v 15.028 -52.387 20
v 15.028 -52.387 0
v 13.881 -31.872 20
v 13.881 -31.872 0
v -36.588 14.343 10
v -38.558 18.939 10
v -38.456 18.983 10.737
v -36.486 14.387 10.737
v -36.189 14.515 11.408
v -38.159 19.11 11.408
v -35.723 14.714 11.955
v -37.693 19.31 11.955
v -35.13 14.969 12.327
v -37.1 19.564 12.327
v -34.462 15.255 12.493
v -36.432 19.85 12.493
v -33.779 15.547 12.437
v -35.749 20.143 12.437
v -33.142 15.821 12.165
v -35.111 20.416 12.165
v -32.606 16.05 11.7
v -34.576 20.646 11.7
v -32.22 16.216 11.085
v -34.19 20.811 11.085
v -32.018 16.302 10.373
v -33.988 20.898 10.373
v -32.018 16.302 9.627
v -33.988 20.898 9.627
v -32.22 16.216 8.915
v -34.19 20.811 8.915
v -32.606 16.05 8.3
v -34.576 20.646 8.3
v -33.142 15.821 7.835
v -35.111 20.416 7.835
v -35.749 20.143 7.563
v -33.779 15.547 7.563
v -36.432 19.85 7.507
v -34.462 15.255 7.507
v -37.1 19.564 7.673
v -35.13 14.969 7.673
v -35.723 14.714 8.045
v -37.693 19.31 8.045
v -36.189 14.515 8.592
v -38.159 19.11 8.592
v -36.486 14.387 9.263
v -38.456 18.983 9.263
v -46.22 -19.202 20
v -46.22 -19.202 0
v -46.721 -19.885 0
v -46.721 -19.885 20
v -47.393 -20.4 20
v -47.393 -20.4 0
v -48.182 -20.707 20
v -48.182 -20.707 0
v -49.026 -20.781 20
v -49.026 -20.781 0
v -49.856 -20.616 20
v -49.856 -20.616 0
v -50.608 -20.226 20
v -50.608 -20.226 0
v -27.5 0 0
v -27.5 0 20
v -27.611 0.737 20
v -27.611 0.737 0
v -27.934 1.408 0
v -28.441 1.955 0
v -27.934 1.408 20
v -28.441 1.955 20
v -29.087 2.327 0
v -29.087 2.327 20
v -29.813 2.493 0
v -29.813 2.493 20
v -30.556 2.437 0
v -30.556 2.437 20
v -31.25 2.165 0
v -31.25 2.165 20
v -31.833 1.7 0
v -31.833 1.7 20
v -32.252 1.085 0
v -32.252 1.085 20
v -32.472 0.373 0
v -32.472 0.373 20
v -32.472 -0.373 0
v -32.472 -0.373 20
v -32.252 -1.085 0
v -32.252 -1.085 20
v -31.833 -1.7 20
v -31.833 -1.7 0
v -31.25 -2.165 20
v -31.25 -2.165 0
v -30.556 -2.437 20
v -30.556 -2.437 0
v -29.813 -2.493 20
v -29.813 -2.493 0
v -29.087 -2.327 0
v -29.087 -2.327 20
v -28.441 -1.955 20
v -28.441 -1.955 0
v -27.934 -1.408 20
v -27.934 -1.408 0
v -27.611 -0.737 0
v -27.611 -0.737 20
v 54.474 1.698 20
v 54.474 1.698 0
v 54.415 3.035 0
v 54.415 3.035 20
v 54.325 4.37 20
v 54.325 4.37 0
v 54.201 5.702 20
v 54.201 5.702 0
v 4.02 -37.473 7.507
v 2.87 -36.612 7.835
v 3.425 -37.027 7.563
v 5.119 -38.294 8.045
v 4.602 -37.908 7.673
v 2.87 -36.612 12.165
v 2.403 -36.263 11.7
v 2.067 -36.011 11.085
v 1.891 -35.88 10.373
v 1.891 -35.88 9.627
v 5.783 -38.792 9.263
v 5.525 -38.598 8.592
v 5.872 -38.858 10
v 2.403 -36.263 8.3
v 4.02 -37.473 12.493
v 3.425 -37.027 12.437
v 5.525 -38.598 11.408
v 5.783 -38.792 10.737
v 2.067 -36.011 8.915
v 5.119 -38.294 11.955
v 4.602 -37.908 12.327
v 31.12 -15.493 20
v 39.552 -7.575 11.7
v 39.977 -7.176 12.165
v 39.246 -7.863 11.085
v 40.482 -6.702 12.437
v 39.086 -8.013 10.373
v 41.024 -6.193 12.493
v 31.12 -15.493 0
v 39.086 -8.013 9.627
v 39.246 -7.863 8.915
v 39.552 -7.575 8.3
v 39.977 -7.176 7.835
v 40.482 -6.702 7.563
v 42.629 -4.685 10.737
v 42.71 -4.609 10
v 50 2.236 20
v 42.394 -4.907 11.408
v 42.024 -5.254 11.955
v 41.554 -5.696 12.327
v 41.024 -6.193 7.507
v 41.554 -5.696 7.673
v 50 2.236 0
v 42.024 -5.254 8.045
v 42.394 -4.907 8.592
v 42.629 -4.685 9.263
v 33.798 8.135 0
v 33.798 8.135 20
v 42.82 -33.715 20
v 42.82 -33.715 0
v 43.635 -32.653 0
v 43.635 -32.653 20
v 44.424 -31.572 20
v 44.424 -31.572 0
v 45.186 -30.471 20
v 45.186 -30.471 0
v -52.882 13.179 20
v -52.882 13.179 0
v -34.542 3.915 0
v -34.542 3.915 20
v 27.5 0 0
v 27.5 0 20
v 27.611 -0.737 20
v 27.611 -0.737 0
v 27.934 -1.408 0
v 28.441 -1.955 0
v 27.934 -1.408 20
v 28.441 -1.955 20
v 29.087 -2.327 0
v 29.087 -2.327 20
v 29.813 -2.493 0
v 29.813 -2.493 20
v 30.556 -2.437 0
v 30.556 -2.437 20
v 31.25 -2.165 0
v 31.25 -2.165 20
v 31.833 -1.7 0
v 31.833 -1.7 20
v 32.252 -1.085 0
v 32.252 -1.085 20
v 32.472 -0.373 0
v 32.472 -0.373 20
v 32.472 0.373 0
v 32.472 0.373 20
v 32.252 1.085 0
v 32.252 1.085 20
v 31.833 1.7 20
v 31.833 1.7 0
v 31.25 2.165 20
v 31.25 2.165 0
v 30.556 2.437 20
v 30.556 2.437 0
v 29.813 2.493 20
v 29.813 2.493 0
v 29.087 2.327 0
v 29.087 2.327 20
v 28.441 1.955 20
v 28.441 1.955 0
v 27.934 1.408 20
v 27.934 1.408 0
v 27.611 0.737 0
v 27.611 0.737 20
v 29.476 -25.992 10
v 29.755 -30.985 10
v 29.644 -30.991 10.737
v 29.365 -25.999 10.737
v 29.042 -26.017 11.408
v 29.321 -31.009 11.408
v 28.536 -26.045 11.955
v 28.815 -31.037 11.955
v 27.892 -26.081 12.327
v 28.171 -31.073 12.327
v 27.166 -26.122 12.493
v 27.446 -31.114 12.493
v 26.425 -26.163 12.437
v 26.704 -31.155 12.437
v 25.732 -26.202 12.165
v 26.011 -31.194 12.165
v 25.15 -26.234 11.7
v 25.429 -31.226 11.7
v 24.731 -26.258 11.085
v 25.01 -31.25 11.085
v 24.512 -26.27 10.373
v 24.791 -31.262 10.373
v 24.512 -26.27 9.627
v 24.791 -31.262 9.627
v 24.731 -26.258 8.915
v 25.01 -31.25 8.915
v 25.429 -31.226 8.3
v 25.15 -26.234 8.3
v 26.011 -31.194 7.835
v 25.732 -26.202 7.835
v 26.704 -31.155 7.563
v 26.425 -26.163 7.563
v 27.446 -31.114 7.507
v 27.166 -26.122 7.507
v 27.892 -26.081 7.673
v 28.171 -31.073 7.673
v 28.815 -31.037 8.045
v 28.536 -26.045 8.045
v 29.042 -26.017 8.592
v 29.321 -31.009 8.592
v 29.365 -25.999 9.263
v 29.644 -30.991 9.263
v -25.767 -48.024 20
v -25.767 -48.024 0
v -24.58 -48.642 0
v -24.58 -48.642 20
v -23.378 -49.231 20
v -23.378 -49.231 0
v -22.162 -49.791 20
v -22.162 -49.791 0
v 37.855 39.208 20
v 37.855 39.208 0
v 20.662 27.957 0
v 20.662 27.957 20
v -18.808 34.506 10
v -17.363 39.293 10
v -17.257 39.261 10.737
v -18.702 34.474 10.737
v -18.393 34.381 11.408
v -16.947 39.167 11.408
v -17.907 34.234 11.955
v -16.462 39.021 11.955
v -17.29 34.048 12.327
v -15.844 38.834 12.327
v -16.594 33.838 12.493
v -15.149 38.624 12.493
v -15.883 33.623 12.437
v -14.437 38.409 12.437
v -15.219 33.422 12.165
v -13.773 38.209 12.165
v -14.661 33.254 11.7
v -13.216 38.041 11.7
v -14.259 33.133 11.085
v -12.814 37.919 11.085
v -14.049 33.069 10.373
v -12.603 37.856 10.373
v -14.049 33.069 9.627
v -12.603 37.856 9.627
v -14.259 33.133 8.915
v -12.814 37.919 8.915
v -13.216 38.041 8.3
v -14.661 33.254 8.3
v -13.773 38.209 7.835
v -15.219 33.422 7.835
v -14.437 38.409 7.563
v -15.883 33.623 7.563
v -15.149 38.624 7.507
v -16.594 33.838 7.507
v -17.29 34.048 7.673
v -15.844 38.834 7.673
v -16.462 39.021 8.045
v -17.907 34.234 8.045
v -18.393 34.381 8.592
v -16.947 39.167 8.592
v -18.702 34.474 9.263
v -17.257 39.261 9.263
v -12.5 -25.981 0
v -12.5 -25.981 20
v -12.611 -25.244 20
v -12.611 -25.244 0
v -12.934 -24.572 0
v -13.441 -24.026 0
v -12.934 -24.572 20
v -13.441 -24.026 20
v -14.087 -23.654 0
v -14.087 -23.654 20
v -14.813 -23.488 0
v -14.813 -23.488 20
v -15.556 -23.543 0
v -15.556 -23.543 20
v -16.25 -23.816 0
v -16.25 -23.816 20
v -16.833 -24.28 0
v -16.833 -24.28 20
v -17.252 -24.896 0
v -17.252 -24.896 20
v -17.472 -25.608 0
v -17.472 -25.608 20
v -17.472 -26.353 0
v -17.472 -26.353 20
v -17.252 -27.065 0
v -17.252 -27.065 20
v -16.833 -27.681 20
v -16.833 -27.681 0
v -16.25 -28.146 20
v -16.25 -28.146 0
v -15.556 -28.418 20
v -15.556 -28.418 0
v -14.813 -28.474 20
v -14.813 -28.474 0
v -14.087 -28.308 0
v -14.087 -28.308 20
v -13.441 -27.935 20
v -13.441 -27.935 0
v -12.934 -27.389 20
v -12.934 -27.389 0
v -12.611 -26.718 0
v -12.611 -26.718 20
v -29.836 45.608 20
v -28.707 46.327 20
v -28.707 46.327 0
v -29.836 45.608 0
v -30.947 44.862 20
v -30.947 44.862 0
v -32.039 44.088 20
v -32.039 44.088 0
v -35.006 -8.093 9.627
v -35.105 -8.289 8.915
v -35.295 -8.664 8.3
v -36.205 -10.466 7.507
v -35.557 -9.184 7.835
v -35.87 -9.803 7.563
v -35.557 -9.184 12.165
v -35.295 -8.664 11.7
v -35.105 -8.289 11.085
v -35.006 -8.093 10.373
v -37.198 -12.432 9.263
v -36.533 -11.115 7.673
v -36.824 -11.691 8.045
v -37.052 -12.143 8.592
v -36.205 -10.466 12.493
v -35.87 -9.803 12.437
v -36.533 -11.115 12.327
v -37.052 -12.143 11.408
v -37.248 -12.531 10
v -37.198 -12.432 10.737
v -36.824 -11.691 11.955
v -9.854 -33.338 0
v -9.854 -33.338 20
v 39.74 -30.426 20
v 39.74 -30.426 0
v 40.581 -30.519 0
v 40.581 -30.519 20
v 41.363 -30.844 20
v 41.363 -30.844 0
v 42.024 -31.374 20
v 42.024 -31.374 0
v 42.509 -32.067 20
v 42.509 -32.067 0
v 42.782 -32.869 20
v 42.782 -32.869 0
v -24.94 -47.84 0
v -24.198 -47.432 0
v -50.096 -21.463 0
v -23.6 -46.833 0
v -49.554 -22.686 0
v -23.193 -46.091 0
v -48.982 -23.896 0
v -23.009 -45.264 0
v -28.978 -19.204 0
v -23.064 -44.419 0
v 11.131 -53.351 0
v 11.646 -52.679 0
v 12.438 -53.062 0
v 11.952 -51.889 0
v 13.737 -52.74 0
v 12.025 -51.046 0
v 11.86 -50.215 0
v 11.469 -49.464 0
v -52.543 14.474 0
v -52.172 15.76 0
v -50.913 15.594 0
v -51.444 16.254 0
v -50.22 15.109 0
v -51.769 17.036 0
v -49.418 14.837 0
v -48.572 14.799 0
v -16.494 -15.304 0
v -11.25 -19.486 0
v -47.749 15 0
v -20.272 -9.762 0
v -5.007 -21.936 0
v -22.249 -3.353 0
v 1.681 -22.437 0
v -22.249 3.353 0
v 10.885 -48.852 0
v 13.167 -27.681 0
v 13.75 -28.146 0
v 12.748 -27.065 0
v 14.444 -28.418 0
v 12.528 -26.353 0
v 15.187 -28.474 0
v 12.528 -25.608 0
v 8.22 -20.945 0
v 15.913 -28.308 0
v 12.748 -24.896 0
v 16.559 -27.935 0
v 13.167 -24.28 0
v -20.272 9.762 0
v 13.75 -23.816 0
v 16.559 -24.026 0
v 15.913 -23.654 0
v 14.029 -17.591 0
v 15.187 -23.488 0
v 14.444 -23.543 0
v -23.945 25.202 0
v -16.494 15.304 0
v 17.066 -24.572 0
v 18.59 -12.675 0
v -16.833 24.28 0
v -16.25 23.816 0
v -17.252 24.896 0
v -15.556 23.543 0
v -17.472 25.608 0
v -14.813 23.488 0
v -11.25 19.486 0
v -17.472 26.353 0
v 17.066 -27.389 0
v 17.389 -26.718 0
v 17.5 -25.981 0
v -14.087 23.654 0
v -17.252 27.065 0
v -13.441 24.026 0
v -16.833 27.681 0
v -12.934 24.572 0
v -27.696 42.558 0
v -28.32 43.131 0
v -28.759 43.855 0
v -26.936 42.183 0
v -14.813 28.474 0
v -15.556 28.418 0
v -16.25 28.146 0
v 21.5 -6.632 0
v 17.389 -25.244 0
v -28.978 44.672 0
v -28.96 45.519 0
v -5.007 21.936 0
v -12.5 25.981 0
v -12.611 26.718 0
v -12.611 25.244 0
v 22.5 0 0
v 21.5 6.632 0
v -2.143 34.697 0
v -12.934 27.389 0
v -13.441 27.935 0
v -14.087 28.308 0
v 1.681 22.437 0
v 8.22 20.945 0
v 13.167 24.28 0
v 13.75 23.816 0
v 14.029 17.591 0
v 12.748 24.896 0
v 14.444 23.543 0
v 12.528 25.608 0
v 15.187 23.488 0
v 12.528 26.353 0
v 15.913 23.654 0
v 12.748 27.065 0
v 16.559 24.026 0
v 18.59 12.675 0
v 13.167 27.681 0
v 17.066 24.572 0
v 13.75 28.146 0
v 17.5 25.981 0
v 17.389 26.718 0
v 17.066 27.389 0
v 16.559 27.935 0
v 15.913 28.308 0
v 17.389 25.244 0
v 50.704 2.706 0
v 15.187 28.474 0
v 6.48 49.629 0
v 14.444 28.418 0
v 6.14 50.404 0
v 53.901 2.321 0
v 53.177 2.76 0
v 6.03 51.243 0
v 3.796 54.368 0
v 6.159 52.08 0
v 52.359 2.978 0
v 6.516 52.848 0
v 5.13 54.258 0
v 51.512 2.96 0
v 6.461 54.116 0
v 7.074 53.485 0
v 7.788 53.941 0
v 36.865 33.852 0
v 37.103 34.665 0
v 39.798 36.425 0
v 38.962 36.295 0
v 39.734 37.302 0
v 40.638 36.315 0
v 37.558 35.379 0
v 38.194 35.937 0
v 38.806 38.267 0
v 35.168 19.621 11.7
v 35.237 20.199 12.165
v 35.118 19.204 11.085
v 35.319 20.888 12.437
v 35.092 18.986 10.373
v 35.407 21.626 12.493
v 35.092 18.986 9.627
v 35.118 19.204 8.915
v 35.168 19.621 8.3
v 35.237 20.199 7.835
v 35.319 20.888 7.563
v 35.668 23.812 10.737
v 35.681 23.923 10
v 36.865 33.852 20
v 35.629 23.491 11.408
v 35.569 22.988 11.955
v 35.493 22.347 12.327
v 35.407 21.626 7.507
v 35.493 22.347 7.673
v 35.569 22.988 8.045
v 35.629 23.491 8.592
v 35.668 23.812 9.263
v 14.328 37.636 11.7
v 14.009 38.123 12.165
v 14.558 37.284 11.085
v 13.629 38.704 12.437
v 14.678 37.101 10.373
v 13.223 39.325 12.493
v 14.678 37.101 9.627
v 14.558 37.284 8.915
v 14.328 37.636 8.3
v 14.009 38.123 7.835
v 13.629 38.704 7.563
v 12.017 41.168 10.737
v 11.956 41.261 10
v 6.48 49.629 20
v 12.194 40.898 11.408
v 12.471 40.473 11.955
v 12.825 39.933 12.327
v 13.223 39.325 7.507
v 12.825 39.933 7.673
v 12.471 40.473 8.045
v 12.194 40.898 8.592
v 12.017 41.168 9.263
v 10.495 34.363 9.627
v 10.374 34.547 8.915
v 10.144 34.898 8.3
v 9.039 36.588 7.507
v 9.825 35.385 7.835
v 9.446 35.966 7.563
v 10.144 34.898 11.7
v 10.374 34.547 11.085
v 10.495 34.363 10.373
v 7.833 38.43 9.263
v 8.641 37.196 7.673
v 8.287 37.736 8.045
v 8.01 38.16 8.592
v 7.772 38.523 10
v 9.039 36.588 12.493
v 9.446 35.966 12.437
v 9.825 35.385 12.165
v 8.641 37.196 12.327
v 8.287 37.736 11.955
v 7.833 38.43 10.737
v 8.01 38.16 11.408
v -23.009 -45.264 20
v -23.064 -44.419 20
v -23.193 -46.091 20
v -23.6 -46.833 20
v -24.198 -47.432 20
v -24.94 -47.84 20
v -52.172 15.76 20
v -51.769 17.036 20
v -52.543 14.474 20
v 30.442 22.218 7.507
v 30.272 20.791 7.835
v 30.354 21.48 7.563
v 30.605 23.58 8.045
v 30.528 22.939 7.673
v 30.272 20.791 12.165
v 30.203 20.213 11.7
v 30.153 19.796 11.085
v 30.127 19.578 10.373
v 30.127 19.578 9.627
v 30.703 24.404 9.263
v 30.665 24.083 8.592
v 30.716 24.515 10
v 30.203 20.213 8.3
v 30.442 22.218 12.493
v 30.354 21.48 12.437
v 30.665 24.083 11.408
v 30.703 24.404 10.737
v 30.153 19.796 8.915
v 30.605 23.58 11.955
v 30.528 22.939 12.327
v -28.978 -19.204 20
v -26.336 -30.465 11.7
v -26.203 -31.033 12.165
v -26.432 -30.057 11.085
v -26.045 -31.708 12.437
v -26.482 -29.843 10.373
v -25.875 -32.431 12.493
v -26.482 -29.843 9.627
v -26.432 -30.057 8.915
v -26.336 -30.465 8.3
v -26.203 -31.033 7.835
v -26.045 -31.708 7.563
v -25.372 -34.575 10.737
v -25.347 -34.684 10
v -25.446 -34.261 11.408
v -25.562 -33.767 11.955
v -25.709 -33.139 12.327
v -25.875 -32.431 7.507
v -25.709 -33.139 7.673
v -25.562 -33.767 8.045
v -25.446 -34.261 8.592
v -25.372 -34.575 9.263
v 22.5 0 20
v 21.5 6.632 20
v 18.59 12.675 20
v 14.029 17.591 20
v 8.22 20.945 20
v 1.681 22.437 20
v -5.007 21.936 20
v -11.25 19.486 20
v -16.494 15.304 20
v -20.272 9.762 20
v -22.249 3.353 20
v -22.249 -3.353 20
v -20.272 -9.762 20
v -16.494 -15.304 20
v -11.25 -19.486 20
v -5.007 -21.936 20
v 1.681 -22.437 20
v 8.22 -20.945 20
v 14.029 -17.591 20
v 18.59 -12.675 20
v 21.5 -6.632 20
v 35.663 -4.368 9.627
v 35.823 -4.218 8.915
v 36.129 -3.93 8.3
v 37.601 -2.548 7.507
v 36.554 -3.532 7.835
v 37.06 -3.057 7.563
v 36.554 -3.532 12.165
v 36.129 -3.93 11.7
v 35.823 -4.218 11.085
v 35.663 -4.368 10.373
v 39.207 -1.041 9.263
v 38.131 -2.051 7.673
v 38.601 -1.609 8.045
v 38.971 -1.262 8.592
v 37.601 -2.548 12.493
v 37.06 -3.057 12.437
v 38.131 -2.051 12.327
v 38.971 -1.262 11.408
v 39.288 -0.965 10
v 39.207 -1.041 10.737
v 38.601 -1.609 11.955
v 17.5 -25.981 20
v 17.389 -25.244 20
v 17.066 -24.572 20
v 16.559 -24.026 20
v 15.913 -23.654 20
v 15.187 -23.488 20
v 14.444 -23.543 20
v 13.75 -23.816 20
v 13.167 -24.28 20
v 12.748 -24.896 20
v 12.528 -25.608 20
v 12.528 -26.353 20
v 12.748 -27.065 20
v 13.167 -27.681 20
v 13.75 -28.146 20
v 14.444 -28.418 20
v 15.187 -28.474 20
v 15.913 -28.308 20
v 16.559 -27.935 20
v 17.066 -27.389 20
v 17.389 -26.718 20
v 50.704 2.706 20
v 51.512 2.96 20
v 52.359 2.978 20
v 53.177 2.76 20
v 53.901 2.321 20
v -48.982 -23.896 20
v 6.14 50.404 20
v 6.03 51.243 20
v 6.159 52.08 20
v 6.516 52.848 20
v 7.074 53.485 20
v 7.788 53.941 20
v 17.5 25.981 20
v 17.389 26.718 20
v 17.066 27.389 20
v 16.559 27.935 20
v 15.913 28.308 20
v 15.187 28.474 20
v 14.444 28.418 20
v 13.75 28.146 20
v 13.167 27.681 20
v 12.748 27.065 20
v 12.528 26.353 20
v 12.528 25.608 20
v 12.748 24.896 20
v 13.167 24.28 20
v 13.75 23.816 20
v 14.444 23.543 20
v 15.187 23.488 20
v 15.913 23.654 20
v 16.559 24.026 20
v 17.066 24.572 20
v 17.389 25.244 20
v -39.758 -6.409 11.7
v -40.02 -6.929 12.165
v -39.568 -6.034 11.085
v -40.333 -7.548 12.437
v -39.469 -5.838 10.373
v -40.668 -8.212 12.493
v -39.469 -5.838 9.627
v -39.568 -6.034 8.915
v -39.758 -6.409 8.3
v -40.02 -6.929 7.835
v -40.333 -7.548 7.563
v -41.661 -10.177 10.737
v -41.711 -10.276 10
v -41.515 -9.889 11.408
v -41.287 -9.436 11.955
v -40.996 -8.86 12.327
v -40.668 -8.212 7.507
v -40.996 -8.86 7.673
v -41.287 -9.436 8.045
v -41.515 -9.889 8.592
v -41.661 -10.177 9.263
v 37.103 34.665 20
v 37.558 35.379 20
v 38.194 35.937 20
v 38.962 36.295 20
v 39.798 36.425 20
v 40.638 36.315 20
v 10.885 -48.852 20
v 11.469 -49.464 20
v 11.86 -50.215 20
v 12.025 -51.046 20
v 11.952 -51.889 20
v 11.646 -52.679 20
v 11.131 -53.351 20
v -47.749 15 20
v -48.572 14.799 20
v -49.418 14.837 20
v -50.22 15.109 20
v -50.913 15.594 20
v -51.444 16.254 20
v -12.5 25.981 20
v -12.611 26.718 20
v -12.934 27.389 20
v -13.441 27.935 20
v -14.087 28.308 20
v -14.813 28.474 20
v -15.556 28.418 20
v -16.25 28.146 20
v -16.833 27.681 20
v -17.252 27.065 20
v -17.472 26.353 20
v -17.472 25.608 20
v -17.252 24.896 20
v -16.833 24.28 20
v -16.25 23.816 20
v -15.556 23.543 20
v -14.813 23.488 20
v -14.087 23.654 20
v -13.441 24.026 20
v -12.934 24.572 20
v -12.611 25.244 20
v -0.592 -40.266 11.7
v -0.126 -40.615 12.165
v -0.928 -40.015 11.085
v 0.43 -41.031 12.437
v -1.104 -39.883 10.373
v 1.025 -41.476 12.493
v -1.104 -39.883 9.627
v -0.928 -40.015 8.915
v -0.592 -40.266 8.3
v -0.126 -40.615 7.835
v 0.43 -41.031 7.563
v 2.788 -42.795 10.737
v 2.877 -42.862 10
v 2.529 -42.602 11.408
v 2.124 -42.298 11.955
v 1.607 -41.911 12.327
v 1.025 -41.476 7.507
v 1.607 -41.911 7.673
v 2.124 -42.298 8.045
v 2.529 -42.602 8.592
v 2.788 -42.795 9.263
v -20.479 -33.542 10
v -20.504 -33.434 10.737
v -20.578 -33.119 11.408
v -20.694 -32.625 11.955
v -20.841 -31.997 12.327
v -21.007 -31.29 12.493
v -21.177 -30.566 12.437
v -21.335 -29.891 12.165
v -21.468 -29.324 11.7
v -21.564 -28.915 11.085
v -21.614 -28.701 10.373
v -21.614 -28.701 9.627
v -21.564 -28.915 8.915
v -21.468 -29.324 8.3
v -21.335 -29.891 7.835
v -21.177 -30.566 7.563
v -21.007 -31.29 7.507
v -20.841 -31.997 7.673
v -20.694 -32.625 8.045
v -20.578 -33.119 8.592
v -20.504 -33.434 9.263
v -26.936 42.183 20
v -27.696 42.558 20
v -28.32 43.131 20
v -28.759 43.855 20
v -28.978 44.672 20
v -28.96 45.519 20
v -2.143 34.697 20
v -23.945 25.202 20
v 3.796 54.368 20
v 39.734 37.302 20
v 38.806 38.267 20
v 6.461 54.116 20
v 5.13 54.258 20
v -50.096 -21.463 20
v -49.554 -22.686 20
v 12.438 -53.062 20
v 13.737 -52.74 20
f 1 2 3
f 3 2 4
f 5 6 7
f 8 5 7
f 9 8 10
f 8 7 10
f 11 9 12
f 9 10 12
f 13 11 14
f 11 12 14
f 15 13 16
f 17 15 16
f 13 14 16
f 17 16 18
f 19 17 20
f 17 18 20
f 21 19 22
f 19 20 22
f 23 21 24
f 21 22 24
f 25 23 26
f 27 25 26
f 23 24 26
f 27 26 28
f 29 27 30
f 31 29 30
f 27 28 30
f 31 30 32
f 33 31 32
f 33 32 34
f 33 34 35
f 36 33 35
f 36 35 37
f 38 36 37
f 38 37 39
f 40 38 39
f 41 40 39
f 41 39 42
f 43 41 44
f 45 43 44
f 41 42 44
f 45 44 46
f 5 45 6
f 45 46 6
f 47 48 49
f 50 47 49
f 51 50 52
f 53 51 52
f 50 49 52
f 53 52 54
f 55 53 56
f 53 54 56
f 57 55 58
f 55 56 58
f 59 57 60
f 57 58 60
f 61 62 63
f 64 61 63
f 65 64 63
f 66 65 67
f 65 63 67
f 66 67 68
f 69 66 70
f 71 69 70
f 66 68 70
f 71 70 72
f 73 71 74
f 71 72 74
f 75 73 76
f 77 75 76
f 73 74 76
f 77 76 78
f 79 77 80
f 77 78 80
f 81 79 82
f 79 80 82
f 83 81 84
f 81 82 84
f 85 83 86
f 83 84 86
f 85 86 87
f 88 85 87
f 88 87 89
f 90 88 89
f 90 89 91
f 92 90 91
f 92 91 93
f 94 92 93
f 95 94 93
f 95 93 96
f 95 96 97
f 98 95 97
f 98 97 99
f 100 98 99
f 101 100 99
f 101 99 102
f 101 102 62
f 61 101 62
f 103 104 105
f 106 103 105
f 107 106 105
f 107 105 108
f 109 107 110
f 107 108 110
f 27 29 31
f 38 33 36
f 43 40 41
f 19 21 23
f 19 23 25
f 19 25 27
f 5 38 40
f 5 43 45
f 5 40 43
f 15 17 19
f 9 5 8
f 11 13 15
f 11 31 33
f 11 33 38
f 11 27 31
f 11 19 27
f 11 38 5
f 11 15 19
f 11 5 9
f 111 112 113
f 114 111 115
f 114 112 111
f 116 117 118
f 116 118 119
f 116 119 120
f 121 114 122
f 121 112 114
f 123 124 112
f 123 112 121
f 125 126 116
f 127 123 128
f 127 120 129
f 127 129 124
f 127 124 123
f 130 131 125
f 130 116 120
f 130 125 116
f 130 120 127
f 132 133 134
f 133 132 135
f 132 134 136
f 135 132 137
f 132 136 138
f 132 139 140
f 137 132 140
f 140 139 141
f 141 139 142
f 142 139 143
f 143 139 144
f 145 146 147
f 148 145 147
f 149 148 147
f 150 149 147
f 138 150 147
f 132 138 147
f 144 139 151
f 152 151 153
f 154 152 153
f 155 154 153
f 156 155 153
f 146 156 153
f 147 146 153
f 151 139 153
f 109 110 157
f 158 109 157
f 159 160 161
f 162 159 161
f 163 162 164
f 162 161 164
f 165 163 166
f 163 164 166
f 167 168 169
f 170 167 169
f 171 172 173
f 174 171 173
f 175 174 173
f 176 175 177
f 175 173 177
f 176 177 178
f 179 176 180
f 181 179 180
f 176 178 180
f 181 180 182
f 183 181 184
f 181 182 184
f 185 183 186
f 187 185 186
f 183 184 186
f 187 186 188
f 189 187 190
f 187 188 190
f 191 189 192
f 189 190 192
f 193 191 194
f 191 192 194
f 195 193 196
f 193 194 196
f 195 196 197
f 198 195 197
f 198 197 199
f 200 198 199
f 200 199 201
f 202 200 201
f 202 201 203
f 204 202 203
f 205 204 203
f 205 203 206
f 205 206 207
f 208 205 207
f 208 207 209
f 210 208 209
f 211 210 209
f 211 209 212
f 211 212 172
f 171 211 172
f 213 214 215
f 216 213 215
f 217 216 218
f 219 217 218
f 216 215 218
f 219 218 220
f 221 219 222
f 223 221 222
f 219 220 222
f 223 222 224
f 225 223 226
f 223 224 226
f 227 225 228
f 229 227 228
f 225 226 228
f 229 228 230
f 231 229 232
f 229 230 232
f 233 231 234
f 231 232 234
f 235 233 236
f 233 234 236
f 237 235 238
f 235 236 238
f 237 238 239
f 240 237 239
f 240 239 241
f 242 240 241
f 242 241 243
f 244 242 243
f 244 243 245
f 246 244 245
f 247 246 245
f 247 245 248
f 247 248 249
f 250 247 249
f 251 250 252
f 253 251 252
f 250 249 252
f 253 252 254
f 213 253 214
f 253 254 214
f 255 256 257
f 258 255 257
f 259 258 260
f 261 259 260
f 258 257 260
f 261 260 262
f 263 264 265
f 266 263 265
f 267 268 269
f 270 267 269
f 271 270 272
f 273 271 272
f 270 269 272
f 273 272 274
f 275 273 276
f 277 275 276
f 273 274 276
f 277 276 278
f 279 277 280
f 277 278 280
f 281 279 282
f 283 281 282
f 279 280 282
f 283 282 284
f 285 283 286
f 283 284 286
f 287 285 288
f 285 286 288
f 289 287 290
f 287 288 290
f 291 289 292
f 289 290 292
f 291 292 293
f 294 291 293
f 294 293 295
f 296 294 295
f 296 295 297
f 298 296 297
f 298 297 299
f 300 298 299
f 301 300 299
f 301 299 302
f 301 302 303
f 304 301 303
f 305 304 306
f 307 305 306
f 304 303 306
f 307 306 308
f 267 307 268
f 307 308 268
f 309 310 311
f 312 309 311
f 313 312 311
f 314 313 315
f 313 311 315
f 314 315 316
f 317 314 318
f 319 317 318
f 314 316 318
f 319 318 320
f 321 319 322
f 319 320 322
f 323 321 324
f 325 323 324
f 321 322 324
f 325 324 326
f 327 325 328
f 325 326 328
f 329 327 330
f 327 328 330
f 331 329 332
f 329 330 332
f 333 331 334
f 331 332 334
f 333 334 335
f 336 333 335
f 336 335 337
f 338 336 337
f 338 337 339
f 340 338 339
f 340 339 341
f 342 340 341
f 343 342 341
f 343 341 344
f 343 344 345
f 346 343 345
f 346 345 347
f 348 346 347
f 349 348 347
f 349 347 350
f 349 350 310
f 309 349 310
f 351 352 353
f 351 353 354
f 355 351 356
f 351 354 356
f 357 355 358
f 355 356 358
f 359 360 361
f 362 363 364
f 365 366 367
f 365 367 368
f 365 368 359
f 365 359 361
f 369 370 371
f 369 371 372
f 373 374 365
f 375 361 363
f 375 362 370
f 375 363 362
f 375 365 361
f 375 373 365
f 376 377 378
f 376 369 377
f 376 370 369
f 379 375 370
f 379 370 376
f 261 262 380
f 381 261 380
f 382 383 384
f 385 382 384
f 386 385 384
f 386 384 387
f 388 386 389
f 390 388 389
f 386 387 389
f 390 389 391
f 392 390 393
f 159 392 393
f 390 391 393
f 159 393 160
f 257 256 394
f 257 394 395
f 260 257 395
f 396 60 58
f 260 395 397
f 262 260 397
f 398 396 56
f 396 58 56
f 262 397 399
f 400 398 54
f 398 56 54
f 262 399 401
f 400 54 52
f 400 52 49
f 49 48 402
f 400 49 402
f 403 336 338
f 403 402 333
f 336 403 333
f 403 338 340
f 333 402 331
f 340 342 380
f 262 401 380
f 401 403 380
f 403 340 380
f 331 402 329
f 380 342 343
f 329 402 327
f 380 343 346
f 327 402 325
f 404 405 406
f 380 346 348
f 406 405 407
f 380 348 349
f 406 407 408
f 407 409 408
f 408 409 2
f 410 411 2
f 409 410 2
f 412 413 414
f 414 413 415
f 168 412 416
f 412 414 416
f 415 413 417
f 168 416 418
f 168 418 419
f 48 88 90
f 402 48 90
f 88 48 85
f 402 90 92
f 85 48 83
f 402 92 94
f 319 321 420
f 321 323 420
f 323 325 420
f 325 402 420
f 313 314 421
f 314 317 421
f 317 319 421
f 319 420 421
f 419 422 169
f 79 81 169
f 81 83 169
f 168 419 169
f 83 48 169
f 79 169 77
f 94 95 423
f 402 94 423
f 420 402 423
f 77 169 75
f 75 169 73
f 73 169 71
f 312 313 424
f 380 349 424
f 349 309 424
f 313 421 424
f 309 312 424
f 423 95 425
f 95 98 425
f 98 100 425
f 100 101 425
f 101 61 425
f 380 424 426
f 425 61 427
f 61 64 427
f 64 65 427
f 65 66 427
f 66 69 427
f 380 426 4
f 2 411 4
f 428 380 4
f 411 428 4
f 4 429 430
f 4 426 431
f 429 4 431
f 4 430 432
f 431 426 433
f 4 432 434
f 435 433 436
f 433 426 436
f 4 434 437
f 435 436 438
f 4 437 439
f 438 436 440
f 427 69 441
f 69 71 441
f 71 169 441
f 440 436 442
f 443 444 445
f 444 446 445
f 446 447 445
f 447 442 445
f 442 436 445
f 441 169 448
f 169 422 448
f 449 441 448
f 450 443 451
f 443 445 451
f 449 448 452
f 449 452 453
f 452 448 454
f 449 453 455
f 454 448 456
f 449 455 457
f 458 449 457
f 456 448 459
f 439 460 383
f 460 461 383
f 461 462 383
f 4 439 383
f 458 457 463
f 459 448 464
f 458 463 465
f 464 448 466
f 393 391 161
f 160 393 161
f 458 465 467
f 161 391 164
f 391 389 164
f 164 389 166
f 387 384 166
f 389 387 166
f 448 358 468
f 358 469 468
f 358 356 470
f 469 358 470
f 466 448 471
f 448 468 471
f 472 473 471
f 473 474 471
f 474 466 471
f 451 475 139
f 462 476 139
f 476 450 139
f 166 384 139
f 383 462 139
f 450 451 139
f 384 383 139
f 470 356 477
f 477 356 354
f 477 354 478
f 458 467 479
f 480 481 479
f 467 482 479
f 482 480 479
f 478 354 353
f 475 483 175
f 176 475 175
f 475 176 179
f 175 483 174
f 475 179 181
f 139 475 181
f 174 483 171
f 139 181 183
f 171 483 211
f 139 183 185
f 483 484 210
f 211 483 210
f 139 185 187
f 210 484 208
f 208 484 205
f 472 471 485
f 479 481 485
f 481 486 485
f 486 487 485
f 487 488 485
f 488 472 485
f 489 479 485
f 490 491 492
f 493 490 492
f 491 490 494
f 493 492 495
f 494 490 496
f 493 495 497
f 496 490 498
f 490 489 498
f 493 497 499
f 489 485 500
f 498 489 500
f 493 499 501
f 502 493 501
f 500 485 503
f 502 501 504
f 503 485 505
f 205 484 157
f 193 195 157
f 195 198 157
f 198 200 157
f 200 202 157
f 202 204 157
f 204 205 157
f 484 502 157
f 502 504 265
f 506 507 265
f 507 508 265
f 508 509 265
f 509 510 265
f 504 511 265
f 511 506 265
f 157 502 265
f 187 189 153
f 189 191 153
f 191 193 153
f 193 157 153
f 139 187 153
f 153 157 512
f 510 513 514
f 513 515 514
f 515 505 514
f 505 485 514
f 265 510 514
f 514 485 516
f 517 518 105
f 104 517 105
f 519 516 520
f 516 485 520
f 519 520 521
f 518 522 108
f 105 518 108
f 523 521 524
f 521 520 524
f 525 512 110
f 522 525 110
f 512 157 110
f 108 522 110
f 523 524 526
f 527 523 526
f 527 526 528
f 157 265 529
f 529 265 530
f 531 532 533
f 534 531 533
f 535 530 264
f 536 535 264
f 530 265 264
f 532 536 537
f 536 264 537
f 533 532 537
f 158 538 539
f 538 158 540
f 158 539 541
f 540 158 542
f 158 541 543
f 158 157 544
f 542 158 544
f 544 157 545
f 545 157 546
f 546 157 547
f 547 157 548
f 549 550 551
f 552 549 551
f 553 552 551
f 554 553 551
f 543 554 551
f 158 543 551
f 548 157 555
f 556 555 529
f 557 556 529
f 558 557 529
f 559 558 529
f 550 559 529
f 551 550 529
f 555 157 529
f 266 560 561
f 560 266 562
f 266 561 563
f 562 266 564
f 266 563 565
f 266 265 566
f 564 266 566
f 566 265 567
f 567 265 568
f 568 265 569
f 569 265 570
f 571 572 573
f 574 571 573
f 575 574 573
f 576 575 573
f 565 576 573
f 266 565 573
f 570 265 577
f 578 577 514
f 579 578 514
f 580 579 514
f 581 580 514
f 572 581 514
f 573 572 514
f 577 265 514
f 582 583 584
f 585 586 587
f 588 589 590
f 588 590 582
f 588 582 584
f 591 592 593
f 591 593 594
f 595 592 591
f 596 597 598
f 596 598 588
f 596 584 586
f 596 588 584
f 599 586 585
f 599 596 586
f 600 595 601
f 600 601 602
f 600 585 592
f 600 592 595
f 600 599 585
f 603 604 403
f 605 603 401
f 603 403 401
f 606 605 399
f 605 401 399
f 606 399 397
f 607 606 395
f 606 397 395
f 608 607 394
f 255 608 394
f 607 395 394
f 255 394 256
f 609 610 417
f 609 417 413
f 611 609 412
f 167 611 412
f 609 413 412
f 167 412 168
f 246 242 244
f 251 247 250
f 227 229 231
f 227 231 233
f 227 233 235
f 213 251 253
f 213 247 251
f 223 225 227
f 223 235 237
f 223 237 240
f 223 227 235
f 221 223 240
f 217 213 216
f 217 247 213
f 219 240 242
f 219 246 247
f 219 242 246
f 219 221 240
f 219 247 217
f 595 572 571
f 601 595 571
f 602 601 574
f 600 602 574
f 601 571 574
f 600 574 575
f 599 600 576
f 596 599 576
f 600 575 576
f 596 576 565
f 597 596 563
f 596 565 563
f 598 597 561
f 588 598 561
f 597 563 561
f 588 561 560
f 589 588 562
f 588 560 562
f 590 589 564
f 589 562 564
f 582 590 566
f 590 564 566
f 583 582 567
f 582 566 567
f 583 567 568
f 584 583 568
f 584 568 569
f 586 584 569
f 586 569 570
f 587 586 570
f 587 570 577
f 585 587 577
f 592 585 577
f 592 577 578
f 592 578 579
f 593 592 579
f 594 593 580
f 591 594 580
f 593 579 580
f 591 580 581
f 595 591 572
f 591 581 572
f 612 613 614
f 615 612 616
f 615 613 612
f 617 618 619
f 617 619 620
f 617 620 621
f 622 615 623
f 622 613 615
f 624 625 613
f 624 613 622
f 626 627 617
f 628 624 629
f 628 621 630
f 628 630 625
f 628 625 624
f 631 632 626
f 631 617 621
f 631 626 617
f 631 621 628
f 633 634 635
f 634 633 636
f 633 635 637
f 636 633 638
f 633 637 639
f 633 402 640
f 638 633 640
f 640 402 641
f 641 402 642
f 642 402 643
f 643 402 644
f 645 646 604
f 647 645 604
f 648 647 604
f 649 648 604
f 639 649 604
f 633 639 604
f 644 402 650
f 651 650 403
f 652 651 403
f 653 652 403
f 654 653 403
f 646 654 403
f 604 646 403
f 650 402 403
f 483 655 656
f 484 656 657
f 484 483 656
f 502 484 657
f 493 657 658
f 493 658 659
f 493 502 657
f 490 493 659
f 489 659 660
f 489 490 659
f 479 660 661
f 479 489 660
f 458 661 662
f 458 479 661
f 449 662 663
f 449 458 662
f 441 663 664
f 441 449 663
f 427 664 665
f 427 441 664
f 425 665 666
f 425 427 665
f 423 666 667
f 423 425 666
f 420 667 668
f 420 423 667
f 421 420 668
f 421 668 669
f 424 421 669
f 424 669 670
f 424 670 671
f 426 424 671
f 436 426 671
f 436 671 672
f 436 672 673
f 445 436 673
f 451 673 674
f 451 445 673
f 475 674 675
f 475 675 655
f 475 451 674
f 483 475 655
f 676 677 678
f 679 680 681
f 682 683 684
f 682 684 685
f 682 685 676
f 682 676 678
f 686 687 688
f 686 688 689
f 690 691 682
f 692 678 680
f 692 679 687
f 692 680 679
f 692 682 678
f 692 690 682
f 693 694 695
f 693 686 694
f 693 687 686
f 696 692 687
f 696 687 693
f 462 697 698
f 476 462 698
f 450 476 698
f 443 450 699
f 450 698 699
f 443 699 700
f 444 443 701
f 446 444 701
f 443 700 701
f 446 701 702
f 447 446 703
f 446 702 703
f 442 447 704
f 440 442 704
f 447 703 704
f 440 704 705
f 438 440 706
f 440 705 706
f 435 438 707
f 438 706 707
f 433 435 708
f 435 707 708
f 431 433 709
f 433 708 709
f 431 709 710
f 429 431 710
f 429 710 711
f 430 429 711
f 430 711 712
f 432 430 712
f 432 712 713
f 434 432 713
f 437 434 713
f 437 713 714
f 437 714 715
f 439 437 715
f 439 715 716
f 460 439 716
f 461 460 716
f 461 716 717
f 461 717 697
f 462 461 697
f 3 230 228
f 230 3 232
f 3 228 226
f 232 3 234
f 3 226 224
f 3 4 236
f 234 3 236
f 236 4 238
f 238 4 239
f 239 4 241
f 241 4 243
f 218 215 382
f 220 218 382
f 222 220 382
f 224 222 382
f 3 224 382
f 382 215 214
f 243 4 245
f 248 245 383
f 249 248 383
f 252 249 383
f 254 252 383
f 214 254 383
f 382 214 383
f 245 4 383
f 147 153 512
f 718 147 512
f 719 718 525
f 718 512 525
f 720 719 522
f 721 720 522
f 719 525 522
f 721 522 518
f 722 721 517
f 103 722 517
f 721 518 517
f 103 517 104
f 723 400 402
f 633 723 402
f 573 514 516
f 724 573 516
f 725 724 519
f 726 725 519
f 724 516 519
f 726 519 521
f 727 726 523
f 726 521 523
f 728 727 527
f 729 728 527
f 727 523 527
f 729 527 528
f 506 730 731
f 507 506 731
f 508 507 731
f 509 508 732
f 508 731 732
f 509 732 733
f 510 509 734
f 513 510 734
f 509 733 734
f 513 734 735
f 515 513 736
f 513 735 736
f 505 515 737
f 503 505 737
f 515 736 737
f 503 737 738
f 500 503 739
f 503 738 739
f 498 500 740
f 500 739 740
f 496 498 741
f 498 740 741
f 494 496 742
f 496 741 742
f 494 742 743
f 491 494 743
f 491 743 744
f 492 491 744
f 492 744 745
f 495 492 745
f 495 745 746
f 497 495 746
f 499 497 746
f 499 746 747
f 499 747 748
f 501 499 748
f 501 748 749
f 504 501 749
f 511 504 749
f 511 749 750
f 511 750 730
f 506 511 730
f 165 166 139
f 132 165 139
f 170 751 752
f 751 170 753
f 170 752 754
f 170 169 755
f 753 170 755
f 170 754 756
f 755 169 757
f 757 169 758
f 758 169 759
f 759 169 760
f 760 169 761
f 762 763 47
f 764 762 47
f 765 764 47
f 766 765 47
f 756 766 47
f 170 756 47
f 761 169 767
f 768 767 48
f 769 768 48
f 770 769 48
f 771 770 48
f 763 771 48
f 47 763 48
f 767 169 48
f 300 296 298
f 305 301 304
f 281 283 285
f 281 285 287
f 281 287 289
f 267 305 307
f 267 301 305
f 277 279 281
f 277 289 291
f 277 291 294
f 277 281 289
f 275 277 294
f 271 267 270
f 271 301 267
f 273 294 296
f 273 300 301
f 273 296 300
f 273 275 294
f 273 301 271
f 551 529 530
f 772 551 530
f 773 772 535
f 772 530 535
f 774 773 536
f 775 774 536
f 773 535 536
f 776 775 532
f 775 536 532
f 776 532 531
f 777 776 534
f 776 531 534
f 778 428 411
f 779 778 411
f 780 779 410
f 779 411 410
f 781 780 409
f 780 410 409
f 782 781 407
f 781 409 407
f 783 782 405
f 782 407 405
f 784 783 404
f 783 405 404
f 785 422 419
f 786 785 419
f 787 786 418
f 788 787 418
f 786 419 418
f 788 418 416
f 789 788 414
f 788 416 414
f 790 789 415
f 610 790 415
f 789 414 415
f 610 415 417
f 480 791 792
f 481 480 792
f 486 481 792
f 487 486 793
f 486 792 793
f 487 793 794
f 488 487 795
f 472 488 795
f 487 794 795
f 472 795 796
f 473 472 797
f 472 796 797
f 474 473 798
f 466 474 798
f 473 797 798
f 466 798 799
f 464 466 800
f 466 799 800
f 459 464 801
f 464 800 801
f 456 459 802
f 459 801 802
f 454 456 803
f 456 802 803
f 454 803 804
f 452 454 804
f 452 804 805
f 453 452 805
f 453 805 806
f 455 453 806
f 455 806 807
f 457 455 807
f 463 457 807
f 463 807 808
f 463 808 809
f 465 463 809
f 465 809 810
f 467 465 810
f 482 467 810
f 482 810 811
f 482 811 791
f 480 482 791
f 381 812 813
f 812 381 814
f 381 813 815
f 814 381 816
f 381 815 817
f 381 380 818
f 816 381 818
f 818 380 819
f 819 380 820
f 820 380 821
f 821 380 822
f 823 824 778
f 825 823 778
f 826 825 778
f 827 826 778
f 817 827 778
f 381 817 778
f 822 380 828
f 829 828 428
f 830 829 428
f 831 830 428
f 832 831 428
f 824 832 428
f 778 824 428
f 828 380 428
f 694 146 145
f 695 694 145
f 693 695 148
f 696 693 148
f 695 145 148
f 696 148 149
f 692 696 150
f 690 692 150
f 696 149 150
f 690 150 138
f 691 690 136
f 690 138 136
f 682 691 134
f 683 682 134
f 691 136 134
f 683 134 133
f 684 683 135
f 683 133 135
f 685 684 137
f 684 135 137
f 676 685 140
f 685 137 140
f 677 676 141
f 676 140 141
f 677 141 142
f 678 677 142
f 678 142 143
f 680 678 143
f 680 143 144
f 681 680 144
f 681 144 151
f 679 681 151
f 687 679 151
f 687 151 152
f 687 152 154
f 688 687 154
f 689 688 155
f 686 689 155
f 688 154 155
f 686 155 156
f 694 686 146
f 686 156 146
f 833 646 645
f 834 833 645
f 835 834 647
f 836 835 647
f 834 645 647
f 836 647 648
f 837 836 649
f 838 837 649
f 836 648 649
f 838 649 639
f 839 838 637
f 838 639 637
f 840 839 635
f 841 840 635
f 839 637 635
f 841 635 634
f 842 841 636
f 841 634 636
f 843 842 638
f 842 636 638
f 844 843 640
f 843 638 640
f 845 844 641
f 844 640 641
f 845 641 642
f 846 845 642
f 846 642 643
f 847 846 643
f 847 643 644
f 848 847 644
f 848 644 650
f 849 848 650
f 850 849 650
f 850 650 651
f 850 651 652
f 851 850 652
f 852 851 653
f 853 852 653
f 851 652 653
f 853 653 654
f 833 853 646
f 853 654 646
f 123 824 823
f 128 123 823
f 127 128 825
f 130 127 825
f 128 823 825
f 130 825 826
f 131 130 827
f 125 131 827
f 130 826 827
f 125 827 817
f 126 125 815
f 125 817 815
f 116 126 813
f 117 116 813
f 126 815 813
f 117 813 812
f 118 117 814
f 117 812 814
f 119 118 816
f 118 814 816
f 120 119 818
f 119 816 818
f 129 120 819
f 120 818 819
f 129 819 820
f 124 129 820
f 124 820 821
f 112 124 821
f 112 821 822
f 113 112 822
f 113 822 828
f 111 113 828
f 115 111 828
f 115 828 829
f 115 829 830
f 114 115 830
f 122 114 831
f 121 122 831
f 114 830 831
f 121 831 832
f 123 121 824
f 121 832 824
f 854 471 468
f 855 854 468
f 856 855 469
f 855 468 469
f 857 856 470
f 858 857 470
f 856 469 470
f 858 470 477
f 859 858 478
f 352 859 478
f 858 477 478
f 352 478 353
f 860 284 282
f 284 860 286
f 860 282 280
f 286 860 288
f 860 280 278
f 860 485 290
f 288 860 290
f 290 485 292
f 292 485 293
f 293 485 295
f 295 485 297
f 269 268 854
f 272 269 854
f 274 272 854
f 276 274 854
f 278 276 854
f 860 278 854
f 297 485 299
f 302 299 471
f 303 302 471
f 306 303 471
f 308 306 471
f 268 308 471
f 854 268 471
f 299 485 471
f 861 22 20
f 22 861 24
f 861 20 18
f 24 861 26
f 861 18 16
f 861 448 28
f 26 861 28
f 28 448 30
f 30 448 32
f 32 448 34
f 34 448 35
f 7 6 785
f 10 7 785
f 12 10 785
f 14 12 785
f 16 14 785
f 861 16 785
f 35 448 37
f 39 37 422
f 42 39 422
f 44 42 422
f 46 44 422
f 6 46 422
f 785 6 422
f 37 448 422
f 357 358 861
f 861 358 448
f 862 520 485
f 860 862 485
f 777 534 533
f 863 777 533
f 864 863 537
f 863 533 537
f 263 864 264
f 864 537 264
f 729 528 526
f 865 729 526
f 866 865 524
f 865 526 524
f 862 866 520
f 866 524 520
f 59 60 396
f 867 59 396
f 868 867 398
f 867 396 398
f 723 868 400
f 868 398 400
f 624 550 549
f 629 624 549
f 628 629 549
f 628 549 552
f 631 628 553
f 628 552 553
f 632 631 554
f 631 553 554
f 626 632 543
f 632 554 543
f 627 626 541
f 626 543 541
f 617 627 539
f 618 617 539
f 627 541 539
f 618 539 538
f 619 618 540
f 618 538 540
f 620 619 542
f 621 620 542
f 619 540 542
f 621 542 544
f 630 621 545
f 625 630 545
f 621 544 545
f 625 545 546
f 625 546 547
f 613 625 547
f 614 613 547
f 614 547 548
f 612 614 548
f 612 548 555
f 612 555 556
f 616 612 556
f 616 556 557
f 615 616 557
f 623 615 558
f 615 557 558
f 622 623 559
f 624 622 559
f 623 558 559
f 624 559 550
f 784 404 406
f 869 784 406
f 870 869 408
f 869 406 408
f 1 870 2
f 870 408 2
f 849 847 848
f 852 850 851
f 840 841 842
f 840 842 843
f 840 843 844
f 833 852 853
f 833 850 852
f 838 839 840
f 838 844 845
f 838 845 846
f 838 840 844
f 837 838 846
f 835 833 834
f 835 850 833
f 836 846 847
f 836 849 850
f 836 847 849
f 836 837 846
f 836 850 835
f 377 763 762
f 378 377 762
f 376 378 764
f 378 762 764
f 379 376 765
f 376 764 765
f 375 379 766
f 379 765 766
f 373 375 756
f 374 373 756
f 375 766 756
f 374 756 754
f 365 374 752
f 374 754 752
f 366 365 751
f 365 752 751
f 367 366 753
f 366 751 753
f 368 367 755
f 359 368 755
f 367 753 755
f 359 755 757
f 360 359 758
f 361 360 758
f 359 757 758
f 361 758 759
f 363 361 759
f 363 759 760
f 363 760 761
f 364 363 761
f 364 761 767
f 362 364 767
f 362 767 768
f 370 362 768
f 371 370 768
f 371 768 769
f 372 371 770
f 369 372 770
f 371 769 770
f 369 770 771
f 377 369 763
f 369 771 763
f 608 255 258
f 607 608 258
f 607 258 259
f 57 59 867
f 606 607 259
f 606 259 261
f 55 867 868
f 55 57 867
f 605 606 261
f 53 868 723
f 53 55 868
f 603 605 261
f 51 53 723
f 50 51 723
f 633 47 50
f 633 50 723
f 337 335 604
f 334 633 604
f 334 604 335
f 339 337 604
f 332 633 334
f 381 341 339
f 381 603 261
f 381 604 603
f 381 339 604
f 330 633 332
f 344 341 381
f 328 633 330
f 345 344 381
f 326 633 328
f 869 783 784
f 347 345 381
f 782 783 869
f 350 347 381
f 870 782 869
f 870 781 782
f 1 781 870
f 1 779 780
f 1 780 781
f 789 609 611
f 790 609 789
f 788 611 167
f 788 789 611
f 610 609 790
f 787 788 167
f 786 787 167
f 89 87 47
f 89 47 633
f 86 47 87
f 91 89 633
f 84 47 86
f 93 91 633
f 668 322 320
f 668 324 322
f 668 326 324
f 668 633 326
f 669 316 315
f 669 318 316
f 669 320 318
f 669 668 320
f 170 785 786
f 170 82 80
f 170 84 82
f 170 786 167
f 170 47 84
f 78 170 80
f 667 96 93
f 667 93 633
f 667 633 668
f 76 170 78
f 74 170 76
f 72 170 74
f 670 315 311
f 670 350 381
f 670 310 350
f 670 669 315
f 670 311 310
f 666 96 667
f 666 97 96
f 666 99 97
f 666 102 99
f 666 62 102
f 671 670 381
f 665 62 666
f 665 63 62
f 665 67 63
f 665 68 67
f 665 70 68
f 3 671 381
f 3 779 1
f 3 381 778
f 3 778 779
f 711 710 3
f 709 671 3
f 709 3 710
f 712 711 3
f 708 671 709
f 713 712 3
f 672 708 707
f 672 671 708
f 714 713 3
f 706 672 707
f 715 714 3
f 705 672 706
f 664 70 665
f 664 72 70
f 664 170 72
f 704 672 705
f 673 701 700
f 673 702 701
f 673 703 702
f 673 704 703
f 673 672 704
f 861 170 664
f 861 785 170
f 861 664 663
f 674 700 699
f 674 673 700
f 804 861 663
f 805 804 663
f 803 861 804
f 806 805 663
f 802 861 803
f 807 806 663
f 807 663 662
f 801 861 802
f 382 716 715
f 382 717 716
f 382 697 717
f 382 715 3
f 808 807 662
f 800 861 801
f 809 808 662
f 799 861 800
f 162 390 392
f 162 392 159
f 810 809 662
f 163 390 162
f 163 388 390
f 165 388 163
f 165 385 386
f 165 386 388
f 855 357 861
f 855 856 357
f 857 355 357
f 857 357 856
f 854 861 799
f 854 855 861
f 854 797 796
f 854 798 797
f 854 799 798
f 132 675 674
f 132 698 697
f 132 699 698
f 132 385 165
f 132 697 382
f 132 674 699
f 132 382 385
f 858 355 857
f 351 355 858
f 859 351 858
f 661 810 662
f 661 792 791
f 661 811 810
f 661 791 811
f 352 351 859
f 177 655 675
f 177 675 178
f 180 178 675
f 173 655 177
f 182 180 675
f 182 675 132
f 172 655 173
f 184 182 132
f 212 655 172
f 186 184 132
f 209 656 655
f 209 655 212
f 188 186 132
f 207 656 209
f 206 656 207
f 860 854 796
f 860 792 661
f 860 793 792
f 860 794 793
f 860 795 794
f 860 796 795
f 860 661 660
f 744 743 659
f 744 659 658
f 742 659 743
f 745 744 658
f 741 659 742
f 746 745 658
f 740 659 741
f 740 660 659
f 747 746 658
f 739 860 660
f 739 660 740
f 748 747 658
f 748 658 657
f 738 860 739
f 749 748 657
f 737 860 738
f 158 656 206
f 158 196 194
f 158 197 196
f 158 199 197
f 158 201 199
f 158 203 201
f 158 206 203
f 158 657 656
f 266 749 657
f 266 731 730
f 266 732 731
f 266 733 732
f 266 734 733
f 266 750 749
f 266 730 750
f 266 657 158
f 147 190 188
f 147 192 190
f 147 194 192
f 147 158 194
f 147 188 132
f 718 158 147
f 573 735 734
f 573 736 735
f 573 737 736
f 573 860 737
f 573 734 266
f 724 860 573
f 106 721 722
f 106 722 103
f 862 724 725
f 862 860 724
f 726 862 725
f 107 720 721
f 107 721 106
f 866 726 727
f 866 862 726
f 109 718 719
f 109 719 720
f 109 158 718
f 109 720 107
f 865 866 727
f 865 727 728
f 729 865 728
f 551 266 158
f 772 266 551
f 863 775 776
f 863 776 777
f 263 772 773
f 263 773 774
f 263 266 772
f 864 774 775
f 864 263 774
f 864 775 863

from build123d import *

# Parameters (mm, degrees)
F0_R      = 22.5
F1_DEPTH  = 20
F2_R      = 2.5
F3_DEPTH  = 20.001
F4_R      = 2.5
F5_DEPTH  = 5
F6_R      = 2.5
F7_DEPTH  = 5
F8_R      = 2.5
F9_DEPTH  = 5
F10_R     = 2.5
F11_DEPTH = 5
F12_R     = 2.5
F13_DEPTH = 5
F14_R     = 2.5
F15_DEPTH = 5
F16_R     = 2.5
F17_DEPTH = 5
F18_R     = 2.5
F19_DEPTH = 5
F20_R     = 2.5
F21_DEPTH = 5


# Not quite as in the source:
# - a feature names something its author has since deleted; it is built from what else it names


with BuildPart() as f1:
    # F0 (on Top) → F1 (new body)
    with BuildSketch(Plane.XY):
        with BuildLine():
            ThreePointArc((50, 2.2360679775), (52.3585771958, 2.9784933095), (54.4735576923, 1.6975017946))
            ThreePointArc((54.4735576923, 1.6975017946), (54.3740921627, 3.7024453378), (54.2008581475, 5.7023658309))
            Line((54.2008581475, 5.7023658309), (33.7982304406, 8.1353188741))
            Line((33.7982304406, 8.1353188741), (36.8649053656, 33.8523079329))
            ThreePointArc((36.8649053656, 33.8523079329), (38.1944585155, 35.9371029308), (40.6380330461, 36.3152897571))
            ThreePointArc((40.6380330461, 36.3152897571), (39.2730851622, 37.7872304071), (37.8548560942, 39.207905709))
            Line((37.8548560942, 39.207905709), (20.6616644432, 27.9570995731))
            Line((20.6616644432, 27.9570995731), (6.4803118028, 49.62867678))
            ThreePointArc((6.4803118028, 49.62867678), (6.1587282118, 52.0803426945), (7.7875210962, 53.9407500428))
            ThreePointArc((7.7875210962, 53.9407500428), (5.7957651426, 54.1909504107), (3.7961461645, 54.3676307585))
            Line((3.7961461645, 54.3676307585), (-2.1427239761, 34.6974426733))
            Line((-2.1427239761, 34.6974426733), (-26.9364916731, 42.1832362005))
            ThreePointArc((-26.9364916731, 42.1832362005), (-28.7587394689, 43.8546113028), (-28.7068585233, 46.3267338987))
            ThreePointArc((-28.7068585233, 46.3267338987), (-30.3934578, 45.2381224517), (-32.038822745, 44.0881371472))
            Line((-32.038822745, 44.0881371472), (-23.9445080332, 25.2024667275))
            Line((-23.9445080332, 25.2024667275), (-47.7494113294, 14.9997905883))
            ThreePointArc((-47.7494113294, 14.9997905883), (-50.2196733343, 15.1088198928), (-51.7689799985, 17.0359240992))
            ThreePointArc((-51.7689799985, 17.0359240992), (-52.3612440523, 15.1178742319), (-52.8824704203, 13.1793141796))
            Line((-52.8824704203, 13.1793141796), (-34.542390668, 3.9149765057))
            Line((-34.542390668, 3.9149765057), (-46.2198507491, -19.2022237443))
            ThreePointArc((-46.2198507491, -19.2022237443), (-48.1822639171, -20.7065562608), (-50.6078203843, -20.2261839196))
            ThreePointArc((-50.6078203843, -20.2261839196), (-49.8286222822, -22.0761953575), (-48.9818224627, -23.8962563644))
            Line((-48.9818224627, -23.8962563644), (-28.9775048134, -19.2043747332))
            Line((-28.9775048134, -19.2043747332), (-23.0635083269, -44.419304178))
            ThreePointArc((-23.0635083269, -44.419304178), (-23.5998377269, -46.8331046123), (-25.766699169, -48.0242356934))
            ThreePointArc((-25.766699169, -48.0242356934), (-23.9806343627, -48.9405677895), (-22.1620354025, -49.7905029782))
            Line((-22.1620354025, -49.7905029782), (-9.8537224074, -33.3377856016))
            Line((-9.8537224074, -33.3377856016), (10.8845059639, -48.8520985212))
            ThreePointArc((10.8845059639, -48.8520985212), (12.0252148188, -51.0459228237), (11.1309469524, -53.3512138563))
            ThreePointArc((11.1309469524, -53.3512138563), (13.0881588901, -52.905104639), (15.0276143261, -52.3872198887))
            Line((15.0276143261, -52.3872198887), (13.8807262249, -31.8720760788))
            Line((13.8807262249, -31.8720760788), (39.7395389463, -30.4264530357))
            ThreePointArc((39.7395389463, -30.4264530357), (42.0235357053, -31.3737864336), (42.8202992881, -33.7145661232))
            ThreePointArc((42.8202992881, -33.7145661232), (44.0328571396, -32.1147550532), (45.1856762982, -30.4713743942))
            Line((45.1856762982, -30.4713743942), (31.1202287894, -15.49306794))
            Line((31.1202287894, -15.49306794), (50, 2.2360679775))
        make_face()
        Circle(F0_R, mode=Mode.SUBTRACT)
    extrude(amount=F1_DEPTH)

    # F2 (on face) → F3 (cut, through all)
    with BuildSketch(Plane.XY.offset(20)):
        with Locations((15, 25.9807621135)):
            Circle(F2_R)
        with BuildLine():
            ThreePointArc((32.5, 0), (30, 2.5), (27.5, 0))
            ThreePointArc((27.5, 0), (30, -2.5), (32.5, 0))
        make_face()
        with Locations((15, -25.9807621135)):
            Circle(F2_R)
        with Locations((-15, -25.9807621135)):
            Circle(F2_R)
        with Locations((-30, 0)):
            Circle(F2_R)
        with Locations((-15, 25.9807621135)):
            Circle(F2_R)
    extrude(amount=-F3_DEPTH, mode=Mode.SUBTRACT)

    # F4 (on face) → F5 (cut)
    with BuildSketch(Plane(origin=(32.3678514777, -3.8597706083, 0), x_dir=(0.1184081423, 0.9929650104, 0), z_dir=(0.9929650104, -0.1184081423, 0))):
        with Locations((25.4792622567, 10)):
            Circle(F4_R)
    extrude(amount=-F5_DEPTH, mode=Mode.SUBTRACT)

    # F6 (on face) → F7 (cut)
    with BuildSketch(Plane(origin=(27.2762254834, 17.8488980559, 0), x_dir=(-0.5475597061, 0.8367666151, 0), z_dir=(0.8367666151, 0.5475597061, 0))):
        with Locations((25.4792622567, 10)):
            Circle(F6_R)
    extrude(amount=-F7_DEPTH, mode=Mode.SUBTRACT)

    # F8 (on face) → F9 (cut)
    with BuildSketch(Plane(origin=(9.421750444, 31.2058689513, 0), x_dir=(-0.9573182826, 0.289035821, 0), z_dir=(0.289035821, 0.9573182826, 0))):
        with Locations((25.4792622567, 10)):
            Circle(F8_R)
    extrude(amount=-F9_DEPTH, mode=Mode.SUBTRACT)

    # F10 (on face) → F11 (cut)
    with BuildSketch(Plane(origin=(-12.8412663393, 29.9612669498, 0), x_dir=(-0.9191369952, -0.393938046, 0), z_dir=(-0.393938046, 0.9191369952, 0))):
        with Locations((25.4792622567, 10)):
            Circle(F10_R)
    extrude(amount=-F11_DEPTH, mode=Mode.SUBTRACT)

    # F12 (on face) → F13 (cut)
    with BuildSketch(Plane(origin=(-29.0957118877, 14.6974551601, 0), x_dir=(-0.4508812927, -0.8925839232, 0), z_dir=(-0.8925839232, 0.4508812927, 0))):
        with Locations((25.4792622567, 10)):
            Circle(F12_R)
    extrude(amount=-F13_DEPTH, mode=Mode.SUBTRACT)

    # F14 (on face) → F15 (cut)
    with BuildSketch(Plane(origin=(-31.735950481, -7.4434592431, 0), x_dir=(0.2283467777, -0.9735798627, 0), z_dir=(-0.9735798627, -0.2283467777, 0))):
        with Locations((25.4792622567, 10)):
            Circle(F14_R)
    extrude(amount=-F15_DEPTH, mode=Mode.SUBTRACT)

    # F16 (on face) → F17 (cut)
    with BuildSketch(Plane(origin=(-19.5265851384, -26.1014963415, 0), x_dir=(0.8007288529, -0.5990269644, 0), z_dir=(-0.5990269644, -0.8007288529, 0))):
        with Locations((25.4792622567, 10)):
            Circle(F16_R)
    extrude(amount=-F17_DEPTH, mode=Mode.SUBTRACT)

    # F18 (on face) → F19 (cut)
    with BuildSketch(Plane(origin=(1.8194864043, -32.546353216, 0), x_dir=(0.9984409988, 0.055817308, 0), z_dir=(0.055817308, -0.9984409988, 0))):
        with Locations((25.4792622567, 10)):
            Circle(F18_R)
    extrude(amount=-F19_DEPTH, mode=Mode.SUBTRACT)

    # F20 (on face) → F21 (cut)
    with BuildSketch(Plane(origin=(22.314200037, -23.7624097082, 0), x_dir=(0.7289715049, 0.6845440417, 0), z_dir=(0.6845440417, -0.7289715049, 0))):
        with Locations((25.4792622567, 10)):
            Circle(F20_R)
    extrude(amount=-F21_DEPTH, mode=Mode.SUBTRACT)


solid = f1.part
